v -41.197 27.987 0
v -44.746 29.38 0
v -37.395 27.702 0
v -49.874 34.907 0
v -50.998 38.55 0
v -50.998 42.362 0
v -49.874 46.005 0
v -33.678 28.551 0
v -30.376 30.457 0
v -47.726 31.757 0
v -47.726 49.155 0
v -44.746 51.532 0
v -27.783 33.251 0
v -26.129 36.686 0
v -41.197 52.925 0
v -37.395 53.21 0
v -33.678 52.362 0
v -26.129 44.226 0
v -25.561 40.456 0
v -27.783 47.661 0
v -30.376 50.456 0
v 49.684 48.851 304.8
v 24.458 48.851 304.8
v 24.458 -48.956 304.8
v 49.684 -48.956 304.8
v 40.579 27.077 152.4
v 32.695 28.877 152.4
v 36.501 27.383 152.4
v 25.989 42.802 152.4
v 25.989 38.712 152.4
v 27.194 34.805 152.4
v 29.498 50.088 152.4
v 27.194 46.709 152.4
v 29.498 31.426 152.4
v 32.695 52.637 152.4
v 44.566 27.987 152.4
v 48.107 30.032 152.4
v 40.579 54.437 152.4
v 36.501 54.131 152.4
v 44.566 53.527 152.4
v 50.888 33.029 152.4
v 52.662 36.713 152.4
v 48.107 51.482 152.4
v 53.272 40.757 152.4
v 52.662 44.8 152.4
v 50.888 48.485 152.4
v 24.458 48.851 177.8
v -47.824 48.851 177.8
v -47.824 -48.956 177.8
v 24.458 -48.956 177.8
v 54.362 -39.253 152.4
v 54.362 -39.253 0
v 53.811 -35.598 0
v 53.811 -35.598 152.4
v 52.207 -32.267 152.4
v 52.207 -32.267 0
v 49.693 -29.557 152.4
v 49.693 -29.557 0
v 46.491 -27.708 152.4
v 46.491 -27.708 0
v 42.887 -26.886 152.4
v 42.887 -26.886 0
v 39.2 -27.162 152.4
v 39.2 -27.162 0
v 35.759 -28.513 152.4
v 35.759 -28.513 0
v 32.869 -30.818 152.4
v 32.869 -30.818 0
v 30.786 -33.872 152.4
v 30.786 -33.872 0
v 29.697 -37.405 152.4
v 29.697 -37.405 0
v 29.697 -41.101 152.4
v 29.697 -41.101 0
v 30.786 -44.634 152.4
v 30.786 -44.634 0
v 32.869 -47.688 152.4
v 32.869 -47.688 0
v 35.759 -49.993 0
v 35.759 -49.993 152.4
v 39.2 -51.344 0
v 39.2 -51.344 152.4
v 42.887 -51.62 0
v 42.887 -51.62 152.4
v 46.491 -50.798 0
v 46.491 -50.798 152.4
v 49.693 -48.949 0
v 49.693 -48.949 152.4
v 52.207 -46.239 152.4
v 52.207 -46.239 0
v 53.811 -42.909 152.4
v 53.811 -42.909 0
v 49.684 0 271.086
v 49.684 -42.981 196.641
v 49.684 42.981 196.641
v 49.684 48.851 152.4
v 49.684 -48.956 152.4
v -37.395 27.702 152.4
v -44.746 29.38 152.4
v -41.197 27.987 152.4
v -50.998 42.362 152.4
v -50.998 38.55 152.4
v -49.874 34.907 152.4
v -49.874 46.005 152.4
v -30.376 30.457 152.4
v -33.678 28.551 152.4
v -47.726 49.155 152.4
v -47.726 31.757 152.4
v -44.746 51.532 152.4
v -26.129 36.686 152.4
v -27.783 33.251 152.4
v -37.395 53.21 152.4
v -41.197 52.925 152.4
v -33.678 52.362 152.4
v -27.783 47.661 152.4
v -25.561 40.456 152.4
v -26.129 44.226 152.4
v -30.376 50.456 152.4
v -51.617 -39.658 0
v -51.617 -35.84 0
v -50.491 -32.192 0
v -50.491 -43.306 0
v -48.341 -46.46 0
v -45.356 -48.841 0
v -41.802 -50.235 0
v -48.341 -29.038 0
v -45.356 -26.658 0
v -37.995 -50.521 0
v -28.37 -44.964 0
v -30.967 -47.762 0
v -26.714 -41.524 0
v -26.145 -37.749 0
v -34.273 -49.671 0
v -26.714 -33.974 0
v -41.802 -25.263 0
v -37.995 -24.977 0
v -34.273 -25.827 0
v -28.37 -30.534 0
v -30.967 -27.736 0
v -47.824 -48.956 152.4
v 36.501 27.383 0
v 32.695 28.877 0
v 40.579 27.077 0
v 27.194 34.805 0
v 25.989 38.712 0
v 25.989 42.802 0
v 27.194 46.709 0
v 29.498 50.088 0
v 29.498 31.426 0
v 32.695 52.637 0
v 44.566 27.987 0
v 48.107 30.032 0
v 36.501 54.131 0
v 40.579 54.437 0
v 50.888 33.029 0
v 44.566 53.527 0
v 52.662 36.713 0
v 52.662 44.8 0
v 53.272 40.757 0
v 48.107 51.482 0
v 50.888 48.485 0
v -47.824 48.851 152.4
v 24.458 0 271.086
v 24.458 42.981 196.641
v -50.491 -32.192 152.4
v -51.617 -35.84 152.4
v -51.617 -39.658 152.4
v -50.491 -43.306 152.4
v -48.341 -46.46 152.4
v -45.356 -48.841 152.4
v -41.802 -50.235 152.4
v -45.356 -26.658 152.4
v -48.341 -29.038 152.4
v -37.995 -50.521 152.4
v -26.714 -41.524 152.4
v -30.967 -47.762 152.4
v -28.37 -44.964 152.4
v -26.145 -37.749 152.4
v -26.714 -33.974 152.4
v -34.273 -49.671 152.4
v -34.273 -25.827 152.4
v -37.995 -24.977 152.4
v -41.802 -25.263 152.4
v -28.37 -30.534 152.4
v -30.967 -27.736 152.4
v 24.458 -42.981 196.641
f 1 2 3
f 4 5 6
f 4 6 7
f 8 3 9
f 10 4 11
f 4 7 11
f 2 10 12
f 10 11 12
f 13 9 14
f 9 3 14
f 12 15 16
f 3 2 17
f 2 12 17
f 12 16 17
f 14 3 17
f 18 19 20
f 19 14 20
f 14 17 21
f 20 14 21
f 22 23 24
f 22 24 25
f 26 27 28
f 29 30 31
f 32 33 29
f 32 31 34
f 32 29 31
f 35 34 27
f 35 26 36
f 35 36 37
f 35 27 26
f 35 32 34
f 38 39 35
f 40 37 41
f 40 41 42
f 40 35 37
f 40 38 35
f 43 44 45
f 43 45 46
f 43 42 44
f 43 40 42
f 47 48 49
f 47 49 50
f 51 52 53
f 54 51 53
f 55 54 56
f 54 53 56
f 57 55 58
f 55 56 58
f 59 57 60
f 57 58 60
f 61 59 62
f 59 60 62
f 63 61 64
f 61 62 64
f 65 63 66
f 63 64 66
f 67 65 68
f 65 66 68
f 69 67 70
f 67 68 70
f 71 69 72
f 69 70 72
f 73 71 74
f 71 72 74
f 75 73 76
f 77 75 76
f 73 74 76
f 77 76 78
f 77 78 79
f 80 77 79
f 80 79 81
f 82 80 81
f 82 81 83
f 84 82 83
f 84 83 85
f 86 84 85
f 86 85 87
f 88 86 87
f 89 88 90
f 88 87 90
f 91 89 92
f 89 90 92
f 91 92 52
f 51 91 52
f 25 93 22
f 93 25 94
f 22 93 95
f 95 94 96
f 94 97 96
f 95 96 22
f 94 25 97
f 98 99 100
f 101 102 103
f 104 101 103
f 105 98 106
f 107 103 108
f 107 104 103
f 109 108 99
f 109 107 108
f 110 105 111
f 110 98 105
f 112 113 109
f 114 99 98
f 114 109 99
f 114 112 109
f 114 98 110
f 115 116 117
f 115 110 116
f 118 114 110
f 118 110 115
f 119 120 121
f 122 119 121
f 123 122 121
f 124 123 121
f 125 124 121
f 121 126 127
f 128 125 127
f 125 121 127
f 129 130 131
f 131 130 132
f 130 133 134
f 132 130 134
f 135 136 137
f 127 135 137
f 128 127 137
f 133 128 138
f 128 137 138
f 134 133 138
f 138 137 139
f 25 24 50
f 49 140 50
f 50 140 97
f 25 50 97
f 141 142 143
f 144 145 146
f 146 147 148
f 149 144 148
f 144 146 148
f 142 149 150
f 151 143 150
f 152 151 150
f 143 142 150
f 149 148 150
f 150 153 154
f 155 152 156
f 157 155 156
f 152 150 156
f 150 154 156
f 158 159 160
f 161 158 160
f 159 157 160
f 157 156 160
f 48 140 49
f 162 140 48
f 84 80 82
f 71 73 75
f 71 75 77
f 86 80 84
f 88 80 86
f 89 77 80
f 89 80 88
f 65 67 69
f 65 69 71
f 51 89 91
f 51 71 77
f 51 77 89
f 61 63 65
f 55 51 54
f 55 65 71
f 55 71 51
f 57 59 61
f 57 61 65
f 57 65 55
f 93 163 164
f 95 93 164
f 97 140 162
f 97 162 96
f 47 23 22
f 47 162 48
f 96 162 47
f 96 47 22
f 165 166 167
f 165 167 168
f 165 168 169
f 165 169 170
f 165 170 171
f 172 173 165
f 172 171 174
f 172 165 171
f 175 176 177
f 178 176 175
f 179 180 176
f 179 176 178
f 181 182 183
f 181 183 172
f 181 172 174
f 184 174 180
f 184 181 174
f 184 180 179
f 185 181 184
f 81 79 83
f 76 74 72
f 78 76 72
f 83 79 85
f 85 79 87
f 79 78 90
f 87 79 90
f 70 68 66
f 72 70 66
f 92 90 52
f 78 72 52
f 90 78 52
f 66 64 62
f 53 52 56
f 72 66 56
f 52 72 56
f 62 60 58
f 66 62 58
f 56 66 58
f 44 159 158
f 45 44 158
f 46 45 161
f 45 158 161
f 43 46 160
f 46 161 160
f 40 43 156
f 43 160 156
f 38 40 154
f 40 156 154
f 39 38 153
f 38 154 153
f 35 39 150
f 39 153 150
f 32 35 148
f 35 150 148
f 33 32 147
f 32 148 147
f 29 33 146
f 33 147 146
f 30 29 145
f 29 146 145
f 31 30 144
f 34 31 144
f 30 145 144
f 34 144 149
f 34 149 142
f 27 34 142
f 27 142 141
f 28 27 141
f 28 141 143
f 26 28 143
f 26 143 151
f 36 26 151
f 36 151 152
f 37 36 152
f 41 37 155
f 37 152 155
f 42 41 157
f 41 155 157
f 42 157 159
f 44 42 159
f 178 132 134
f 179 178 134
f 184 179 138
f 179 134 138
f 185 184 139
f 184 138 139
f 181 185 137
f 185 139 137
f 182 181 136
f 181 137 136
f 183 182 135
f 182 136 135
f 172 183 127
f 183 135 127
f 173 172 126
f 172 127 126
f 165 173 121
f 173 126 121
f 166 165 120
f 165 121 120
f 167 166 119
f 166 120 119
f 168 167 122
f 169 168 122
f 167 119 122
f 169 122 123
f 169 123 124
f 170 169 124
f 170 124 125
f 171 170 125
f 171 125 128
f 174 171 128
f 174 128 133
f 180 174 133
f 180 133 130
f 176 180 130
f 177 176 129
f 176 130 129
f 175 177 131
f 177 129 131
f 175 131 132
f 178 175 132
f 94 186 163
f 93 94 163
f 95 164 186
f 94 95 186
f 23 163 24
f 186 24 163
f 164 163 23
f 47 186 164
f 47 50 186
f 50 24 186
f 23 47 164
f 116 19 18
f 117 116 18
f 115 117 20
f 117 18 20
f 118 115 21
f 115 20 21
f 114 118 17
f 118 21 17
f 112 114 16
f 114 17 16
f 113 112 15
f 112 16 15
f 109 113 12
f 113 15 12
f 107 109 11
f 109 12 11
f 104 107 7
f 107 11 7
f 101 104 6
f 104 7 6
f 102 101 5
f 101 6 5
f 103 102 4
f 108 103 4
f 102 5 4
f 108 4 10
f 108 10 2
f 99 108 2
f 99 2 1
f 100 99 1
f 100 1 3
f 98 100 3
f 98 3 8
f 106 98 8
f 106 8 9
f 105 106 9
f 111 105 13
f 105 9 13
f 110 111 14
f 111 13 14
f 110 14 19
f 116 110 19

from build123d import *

# Parameters (mm, degrees)
F0_R     = 12.789744
F0_R_2   = 13.718109
F0_R_3   = 12.807418
F0_R_4   = 12.401863
F1_DEPTH = 152.4
F2_W     = 97.507692
F2_H     = 97.806504
F3_DEPTH = 25.4
F4_W     = 25.225804
F4_H     = 97.806504
F5_DEPTH = 127
F7_DEPTH = 76.2


with BuildPart() as f1:
    # F0 (on Top) → F1 (new body)
    with BuildSketch(Plane.XY):
        with Locations((-38.35066, 40.456183)):
            Circle(F0_R)
        with Locations((39.553817, 40.756974)):
            Circle(F0_R_2)
        with Locations((-38.952239, -37.749078)):
            Circle(F0_R_3)
        with Locations((41.960135, -39.253026)):
            Circle(F0_R_4)
    extrude(amount=F1_DEPTH)


with BuildPart() as f3:
    # F2 (on face) → F3 (new body)
    with BuildSketch(Plane.XY.offset(152.4)):
        with Locations((0.930283, -0.052667)):
            Rectangle(F2_W, F2_H)
    extrude(amount=F3_DEPTH)

    # F4 (on face) → F5 (join)
    with BuildSketch(Plane.XY.offset(177.8)):
        with Locations((37.071227, -0.052667)):
            Rectangle(F4_W, F4_H)
    extrude(amount=F5_DEPTH)

    # F6 (on face) → F7 (cut)
    with BuildSketch(Plane(origin=(24.458325, 0, 0), x_dir=(0, -1, 0), z_dir=(-1, 0, 0))):
        Polygon((-42.981061, 196.641117), (42.981061, 196.641117), (0, 271.086499), align=None)
    extrude(amount=-F7_DEPTH, mode=Mode.SUBTRACT)


solid = Compound([f1.part, f3.part])
